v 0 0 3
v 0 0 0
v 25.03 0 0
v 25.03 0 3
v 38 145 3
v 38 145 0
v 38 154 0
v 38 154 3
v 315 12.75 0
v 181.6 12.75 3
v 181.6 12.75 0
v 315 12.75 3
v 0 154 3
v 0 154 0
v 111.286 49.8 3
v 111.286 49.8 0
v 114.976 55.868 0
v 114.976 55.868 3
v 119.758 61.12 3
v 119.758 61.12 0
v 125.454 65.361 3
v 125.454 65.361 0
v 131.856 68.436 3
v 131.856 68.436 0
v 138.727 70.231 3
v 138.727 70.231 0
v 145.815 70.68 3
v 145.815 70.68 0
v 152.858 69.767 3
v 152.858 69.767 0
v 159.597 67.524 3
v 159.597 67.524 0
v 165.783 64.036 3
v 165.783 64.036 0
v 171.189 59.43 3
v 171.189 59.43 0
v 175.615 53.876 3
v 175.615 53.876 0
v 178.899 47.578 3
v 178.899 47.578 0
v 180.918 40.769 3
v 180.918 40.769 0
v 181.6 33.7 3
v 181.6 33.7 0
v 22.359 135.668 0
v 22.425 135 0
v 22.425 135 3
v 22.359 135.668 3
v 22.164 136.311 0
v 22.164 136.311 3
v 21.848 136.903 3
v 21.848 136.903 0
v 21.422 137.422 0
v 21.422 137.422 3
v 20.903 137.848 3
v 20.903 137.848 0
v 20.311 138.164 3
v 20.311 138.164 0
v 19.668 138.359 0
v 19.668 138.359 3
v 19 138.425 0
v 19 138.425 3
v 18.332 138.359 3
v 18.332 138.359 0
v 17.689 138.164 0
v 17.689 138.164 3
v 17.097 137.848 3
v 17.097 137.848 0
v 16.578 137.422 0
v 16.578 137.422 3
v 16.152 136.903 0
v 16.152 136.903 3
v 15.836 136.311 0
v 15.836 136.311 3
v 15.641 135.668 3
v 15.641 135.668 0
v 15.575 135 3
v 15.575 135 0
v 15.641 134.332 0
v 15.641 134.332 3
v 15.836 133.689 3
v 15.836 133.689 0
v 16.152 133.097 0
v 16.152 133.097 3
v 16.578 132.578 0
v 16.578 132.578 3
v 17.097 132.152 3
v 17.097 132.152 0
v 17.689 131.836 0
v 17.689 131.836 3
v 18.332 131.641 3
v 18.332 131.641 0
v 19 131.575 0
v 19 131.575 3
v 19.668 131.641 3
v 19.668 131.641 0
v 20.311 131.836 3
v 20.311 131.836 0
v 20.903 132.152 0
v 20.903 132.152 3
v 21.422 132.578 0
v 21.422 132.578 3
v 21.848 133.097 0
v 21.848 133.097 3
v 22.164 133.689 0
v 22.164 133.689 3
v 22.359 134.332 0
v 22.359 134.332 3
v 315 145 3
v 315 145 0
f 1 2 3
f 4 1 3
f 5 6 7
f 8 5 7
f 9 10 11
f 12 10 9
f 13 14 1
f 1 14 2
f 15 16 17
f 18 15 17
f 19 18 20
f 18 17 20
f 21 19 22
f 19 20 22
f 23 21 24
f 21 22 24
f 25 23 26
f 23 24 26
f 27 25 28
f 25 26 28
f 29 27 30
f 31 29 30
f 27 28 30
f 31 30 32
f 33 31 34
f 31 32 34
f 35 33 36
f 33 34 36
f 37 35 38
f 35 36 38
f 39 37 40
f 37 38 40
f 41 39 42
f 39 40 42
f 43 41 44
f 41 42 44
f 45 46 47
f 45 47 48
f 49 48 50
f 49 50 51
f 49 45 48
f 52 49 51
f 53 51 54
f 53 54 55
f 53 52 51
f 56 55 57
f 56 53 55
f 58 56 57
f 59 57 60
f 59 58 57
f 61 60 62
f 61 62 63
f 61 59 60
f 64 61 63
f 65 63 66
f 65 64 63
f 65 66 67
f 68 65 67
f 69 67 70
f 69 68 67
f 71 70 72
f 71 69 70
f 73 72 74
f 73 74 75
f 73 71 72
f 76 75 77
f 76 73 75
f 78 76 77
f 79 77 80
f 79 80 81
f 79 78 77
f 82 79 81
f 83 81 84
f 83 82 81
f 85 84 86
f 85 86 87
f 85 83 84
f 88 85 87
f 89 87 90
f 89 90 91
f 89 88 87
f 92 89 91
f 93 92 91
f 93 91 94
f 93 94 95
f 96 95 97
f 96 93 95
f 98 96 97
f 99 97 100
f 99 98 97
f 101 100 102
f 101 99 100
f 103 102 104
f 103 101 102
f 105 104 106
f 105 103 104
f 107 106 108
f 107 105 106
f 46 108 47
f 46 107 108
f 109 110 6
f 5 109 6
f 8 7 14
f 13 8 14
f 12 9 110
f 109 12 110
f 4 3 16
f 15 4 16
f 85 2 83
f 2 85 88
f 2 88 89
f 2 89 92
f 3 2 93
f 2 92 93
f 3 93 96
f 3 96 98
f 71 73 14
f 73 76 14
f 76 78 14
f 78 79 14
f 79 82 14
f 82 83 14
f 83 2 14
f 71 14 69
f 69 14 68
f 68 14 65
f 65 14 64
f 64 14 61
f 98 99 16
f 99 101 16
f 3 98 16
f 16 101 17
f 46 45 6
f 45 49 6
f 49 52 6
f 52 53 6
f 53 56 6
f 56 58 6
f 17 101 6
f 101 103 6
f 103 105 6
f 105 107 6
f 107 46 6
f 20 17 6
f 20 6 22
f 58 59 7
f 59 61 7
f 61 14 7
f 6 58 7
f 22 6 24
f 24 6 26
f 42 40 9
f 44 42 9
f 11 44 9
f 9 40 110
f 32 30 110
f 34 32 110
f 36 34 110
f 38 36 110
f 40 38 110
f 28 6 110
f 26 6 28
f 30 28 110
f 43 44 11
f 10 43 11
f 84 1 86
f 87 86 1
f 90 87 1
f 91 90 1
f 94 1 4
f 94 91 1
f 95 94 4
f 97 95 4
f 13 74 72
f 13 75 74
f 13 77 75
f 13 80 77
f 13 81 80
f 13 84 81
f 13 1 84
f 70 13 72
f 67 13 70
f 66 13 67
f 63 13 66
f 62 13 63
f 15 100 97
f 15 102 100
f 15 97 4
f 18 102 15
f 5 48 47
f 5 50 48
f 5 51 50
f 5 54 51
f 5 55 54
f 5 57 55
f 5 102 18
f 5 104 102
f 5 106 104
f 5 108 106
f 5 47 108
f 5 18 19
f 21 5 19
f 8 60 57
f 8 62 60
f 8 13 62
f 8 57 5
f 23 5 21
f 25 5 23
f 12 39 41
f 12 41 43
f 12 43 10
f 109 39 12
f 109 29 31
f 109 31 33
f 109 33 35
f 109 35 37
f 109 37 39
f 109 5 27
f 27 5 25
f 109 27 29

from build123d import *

# Parameters (mm, degrees)
SKETCH2_R           = 3.425
BOSS_EXTRUDE2_DEPTH = 3
SKETCH3_W           = 133.4
SKETCH3_H           = 12.75
CUT_EXTRUDE1_DEPTH  = 351.642267846


with BuildPart() as part:
    # Sketch2 → Boss-Extrude2 (new body)
    with BuildSketch(Plane.XY):
        with BuildLine():
            Line((25.03035901, 0), (111.286489227, 49.8))
            ThreePointArc((111.286489227, 49.8), (152.858332199, 69.766604349), (181.6, 33.7))
            Line((181.6, 33.7), (181.6, 0))
            Line((181.6, 0), (315, 0))
            Line((315, 0), (315, 145))
            Line((315, 145), (38, 145))
            Line((38, 145), (38, 154))
            Line((38, 154), (19, 154))
            Line((19, 154), (0, 154))
            Line((0, 154), (0, 0))
            Line((0, 0), (25.03035901, 0))
        make_face()
        with Locations((19, 135)):
            Circle(SKETCH2_R, mode=Mode.SUBTRACT)
    extrude(amount=BOSS_EXTRUDE2_DEPTH)

    # Sketch3 → Cut-Extrude1 (cut, through all)
    with BuildSketch(Plane.XY.offset(3)):
        with Locations((248.3, 6.375)):
            Rectangle(SKETCH3_W, SKETCH3_H)
    extrude(amount=-CUT_EXTRUDE1_DEPTH, mode=Mode.SUBTRACT)


solid = part.part
